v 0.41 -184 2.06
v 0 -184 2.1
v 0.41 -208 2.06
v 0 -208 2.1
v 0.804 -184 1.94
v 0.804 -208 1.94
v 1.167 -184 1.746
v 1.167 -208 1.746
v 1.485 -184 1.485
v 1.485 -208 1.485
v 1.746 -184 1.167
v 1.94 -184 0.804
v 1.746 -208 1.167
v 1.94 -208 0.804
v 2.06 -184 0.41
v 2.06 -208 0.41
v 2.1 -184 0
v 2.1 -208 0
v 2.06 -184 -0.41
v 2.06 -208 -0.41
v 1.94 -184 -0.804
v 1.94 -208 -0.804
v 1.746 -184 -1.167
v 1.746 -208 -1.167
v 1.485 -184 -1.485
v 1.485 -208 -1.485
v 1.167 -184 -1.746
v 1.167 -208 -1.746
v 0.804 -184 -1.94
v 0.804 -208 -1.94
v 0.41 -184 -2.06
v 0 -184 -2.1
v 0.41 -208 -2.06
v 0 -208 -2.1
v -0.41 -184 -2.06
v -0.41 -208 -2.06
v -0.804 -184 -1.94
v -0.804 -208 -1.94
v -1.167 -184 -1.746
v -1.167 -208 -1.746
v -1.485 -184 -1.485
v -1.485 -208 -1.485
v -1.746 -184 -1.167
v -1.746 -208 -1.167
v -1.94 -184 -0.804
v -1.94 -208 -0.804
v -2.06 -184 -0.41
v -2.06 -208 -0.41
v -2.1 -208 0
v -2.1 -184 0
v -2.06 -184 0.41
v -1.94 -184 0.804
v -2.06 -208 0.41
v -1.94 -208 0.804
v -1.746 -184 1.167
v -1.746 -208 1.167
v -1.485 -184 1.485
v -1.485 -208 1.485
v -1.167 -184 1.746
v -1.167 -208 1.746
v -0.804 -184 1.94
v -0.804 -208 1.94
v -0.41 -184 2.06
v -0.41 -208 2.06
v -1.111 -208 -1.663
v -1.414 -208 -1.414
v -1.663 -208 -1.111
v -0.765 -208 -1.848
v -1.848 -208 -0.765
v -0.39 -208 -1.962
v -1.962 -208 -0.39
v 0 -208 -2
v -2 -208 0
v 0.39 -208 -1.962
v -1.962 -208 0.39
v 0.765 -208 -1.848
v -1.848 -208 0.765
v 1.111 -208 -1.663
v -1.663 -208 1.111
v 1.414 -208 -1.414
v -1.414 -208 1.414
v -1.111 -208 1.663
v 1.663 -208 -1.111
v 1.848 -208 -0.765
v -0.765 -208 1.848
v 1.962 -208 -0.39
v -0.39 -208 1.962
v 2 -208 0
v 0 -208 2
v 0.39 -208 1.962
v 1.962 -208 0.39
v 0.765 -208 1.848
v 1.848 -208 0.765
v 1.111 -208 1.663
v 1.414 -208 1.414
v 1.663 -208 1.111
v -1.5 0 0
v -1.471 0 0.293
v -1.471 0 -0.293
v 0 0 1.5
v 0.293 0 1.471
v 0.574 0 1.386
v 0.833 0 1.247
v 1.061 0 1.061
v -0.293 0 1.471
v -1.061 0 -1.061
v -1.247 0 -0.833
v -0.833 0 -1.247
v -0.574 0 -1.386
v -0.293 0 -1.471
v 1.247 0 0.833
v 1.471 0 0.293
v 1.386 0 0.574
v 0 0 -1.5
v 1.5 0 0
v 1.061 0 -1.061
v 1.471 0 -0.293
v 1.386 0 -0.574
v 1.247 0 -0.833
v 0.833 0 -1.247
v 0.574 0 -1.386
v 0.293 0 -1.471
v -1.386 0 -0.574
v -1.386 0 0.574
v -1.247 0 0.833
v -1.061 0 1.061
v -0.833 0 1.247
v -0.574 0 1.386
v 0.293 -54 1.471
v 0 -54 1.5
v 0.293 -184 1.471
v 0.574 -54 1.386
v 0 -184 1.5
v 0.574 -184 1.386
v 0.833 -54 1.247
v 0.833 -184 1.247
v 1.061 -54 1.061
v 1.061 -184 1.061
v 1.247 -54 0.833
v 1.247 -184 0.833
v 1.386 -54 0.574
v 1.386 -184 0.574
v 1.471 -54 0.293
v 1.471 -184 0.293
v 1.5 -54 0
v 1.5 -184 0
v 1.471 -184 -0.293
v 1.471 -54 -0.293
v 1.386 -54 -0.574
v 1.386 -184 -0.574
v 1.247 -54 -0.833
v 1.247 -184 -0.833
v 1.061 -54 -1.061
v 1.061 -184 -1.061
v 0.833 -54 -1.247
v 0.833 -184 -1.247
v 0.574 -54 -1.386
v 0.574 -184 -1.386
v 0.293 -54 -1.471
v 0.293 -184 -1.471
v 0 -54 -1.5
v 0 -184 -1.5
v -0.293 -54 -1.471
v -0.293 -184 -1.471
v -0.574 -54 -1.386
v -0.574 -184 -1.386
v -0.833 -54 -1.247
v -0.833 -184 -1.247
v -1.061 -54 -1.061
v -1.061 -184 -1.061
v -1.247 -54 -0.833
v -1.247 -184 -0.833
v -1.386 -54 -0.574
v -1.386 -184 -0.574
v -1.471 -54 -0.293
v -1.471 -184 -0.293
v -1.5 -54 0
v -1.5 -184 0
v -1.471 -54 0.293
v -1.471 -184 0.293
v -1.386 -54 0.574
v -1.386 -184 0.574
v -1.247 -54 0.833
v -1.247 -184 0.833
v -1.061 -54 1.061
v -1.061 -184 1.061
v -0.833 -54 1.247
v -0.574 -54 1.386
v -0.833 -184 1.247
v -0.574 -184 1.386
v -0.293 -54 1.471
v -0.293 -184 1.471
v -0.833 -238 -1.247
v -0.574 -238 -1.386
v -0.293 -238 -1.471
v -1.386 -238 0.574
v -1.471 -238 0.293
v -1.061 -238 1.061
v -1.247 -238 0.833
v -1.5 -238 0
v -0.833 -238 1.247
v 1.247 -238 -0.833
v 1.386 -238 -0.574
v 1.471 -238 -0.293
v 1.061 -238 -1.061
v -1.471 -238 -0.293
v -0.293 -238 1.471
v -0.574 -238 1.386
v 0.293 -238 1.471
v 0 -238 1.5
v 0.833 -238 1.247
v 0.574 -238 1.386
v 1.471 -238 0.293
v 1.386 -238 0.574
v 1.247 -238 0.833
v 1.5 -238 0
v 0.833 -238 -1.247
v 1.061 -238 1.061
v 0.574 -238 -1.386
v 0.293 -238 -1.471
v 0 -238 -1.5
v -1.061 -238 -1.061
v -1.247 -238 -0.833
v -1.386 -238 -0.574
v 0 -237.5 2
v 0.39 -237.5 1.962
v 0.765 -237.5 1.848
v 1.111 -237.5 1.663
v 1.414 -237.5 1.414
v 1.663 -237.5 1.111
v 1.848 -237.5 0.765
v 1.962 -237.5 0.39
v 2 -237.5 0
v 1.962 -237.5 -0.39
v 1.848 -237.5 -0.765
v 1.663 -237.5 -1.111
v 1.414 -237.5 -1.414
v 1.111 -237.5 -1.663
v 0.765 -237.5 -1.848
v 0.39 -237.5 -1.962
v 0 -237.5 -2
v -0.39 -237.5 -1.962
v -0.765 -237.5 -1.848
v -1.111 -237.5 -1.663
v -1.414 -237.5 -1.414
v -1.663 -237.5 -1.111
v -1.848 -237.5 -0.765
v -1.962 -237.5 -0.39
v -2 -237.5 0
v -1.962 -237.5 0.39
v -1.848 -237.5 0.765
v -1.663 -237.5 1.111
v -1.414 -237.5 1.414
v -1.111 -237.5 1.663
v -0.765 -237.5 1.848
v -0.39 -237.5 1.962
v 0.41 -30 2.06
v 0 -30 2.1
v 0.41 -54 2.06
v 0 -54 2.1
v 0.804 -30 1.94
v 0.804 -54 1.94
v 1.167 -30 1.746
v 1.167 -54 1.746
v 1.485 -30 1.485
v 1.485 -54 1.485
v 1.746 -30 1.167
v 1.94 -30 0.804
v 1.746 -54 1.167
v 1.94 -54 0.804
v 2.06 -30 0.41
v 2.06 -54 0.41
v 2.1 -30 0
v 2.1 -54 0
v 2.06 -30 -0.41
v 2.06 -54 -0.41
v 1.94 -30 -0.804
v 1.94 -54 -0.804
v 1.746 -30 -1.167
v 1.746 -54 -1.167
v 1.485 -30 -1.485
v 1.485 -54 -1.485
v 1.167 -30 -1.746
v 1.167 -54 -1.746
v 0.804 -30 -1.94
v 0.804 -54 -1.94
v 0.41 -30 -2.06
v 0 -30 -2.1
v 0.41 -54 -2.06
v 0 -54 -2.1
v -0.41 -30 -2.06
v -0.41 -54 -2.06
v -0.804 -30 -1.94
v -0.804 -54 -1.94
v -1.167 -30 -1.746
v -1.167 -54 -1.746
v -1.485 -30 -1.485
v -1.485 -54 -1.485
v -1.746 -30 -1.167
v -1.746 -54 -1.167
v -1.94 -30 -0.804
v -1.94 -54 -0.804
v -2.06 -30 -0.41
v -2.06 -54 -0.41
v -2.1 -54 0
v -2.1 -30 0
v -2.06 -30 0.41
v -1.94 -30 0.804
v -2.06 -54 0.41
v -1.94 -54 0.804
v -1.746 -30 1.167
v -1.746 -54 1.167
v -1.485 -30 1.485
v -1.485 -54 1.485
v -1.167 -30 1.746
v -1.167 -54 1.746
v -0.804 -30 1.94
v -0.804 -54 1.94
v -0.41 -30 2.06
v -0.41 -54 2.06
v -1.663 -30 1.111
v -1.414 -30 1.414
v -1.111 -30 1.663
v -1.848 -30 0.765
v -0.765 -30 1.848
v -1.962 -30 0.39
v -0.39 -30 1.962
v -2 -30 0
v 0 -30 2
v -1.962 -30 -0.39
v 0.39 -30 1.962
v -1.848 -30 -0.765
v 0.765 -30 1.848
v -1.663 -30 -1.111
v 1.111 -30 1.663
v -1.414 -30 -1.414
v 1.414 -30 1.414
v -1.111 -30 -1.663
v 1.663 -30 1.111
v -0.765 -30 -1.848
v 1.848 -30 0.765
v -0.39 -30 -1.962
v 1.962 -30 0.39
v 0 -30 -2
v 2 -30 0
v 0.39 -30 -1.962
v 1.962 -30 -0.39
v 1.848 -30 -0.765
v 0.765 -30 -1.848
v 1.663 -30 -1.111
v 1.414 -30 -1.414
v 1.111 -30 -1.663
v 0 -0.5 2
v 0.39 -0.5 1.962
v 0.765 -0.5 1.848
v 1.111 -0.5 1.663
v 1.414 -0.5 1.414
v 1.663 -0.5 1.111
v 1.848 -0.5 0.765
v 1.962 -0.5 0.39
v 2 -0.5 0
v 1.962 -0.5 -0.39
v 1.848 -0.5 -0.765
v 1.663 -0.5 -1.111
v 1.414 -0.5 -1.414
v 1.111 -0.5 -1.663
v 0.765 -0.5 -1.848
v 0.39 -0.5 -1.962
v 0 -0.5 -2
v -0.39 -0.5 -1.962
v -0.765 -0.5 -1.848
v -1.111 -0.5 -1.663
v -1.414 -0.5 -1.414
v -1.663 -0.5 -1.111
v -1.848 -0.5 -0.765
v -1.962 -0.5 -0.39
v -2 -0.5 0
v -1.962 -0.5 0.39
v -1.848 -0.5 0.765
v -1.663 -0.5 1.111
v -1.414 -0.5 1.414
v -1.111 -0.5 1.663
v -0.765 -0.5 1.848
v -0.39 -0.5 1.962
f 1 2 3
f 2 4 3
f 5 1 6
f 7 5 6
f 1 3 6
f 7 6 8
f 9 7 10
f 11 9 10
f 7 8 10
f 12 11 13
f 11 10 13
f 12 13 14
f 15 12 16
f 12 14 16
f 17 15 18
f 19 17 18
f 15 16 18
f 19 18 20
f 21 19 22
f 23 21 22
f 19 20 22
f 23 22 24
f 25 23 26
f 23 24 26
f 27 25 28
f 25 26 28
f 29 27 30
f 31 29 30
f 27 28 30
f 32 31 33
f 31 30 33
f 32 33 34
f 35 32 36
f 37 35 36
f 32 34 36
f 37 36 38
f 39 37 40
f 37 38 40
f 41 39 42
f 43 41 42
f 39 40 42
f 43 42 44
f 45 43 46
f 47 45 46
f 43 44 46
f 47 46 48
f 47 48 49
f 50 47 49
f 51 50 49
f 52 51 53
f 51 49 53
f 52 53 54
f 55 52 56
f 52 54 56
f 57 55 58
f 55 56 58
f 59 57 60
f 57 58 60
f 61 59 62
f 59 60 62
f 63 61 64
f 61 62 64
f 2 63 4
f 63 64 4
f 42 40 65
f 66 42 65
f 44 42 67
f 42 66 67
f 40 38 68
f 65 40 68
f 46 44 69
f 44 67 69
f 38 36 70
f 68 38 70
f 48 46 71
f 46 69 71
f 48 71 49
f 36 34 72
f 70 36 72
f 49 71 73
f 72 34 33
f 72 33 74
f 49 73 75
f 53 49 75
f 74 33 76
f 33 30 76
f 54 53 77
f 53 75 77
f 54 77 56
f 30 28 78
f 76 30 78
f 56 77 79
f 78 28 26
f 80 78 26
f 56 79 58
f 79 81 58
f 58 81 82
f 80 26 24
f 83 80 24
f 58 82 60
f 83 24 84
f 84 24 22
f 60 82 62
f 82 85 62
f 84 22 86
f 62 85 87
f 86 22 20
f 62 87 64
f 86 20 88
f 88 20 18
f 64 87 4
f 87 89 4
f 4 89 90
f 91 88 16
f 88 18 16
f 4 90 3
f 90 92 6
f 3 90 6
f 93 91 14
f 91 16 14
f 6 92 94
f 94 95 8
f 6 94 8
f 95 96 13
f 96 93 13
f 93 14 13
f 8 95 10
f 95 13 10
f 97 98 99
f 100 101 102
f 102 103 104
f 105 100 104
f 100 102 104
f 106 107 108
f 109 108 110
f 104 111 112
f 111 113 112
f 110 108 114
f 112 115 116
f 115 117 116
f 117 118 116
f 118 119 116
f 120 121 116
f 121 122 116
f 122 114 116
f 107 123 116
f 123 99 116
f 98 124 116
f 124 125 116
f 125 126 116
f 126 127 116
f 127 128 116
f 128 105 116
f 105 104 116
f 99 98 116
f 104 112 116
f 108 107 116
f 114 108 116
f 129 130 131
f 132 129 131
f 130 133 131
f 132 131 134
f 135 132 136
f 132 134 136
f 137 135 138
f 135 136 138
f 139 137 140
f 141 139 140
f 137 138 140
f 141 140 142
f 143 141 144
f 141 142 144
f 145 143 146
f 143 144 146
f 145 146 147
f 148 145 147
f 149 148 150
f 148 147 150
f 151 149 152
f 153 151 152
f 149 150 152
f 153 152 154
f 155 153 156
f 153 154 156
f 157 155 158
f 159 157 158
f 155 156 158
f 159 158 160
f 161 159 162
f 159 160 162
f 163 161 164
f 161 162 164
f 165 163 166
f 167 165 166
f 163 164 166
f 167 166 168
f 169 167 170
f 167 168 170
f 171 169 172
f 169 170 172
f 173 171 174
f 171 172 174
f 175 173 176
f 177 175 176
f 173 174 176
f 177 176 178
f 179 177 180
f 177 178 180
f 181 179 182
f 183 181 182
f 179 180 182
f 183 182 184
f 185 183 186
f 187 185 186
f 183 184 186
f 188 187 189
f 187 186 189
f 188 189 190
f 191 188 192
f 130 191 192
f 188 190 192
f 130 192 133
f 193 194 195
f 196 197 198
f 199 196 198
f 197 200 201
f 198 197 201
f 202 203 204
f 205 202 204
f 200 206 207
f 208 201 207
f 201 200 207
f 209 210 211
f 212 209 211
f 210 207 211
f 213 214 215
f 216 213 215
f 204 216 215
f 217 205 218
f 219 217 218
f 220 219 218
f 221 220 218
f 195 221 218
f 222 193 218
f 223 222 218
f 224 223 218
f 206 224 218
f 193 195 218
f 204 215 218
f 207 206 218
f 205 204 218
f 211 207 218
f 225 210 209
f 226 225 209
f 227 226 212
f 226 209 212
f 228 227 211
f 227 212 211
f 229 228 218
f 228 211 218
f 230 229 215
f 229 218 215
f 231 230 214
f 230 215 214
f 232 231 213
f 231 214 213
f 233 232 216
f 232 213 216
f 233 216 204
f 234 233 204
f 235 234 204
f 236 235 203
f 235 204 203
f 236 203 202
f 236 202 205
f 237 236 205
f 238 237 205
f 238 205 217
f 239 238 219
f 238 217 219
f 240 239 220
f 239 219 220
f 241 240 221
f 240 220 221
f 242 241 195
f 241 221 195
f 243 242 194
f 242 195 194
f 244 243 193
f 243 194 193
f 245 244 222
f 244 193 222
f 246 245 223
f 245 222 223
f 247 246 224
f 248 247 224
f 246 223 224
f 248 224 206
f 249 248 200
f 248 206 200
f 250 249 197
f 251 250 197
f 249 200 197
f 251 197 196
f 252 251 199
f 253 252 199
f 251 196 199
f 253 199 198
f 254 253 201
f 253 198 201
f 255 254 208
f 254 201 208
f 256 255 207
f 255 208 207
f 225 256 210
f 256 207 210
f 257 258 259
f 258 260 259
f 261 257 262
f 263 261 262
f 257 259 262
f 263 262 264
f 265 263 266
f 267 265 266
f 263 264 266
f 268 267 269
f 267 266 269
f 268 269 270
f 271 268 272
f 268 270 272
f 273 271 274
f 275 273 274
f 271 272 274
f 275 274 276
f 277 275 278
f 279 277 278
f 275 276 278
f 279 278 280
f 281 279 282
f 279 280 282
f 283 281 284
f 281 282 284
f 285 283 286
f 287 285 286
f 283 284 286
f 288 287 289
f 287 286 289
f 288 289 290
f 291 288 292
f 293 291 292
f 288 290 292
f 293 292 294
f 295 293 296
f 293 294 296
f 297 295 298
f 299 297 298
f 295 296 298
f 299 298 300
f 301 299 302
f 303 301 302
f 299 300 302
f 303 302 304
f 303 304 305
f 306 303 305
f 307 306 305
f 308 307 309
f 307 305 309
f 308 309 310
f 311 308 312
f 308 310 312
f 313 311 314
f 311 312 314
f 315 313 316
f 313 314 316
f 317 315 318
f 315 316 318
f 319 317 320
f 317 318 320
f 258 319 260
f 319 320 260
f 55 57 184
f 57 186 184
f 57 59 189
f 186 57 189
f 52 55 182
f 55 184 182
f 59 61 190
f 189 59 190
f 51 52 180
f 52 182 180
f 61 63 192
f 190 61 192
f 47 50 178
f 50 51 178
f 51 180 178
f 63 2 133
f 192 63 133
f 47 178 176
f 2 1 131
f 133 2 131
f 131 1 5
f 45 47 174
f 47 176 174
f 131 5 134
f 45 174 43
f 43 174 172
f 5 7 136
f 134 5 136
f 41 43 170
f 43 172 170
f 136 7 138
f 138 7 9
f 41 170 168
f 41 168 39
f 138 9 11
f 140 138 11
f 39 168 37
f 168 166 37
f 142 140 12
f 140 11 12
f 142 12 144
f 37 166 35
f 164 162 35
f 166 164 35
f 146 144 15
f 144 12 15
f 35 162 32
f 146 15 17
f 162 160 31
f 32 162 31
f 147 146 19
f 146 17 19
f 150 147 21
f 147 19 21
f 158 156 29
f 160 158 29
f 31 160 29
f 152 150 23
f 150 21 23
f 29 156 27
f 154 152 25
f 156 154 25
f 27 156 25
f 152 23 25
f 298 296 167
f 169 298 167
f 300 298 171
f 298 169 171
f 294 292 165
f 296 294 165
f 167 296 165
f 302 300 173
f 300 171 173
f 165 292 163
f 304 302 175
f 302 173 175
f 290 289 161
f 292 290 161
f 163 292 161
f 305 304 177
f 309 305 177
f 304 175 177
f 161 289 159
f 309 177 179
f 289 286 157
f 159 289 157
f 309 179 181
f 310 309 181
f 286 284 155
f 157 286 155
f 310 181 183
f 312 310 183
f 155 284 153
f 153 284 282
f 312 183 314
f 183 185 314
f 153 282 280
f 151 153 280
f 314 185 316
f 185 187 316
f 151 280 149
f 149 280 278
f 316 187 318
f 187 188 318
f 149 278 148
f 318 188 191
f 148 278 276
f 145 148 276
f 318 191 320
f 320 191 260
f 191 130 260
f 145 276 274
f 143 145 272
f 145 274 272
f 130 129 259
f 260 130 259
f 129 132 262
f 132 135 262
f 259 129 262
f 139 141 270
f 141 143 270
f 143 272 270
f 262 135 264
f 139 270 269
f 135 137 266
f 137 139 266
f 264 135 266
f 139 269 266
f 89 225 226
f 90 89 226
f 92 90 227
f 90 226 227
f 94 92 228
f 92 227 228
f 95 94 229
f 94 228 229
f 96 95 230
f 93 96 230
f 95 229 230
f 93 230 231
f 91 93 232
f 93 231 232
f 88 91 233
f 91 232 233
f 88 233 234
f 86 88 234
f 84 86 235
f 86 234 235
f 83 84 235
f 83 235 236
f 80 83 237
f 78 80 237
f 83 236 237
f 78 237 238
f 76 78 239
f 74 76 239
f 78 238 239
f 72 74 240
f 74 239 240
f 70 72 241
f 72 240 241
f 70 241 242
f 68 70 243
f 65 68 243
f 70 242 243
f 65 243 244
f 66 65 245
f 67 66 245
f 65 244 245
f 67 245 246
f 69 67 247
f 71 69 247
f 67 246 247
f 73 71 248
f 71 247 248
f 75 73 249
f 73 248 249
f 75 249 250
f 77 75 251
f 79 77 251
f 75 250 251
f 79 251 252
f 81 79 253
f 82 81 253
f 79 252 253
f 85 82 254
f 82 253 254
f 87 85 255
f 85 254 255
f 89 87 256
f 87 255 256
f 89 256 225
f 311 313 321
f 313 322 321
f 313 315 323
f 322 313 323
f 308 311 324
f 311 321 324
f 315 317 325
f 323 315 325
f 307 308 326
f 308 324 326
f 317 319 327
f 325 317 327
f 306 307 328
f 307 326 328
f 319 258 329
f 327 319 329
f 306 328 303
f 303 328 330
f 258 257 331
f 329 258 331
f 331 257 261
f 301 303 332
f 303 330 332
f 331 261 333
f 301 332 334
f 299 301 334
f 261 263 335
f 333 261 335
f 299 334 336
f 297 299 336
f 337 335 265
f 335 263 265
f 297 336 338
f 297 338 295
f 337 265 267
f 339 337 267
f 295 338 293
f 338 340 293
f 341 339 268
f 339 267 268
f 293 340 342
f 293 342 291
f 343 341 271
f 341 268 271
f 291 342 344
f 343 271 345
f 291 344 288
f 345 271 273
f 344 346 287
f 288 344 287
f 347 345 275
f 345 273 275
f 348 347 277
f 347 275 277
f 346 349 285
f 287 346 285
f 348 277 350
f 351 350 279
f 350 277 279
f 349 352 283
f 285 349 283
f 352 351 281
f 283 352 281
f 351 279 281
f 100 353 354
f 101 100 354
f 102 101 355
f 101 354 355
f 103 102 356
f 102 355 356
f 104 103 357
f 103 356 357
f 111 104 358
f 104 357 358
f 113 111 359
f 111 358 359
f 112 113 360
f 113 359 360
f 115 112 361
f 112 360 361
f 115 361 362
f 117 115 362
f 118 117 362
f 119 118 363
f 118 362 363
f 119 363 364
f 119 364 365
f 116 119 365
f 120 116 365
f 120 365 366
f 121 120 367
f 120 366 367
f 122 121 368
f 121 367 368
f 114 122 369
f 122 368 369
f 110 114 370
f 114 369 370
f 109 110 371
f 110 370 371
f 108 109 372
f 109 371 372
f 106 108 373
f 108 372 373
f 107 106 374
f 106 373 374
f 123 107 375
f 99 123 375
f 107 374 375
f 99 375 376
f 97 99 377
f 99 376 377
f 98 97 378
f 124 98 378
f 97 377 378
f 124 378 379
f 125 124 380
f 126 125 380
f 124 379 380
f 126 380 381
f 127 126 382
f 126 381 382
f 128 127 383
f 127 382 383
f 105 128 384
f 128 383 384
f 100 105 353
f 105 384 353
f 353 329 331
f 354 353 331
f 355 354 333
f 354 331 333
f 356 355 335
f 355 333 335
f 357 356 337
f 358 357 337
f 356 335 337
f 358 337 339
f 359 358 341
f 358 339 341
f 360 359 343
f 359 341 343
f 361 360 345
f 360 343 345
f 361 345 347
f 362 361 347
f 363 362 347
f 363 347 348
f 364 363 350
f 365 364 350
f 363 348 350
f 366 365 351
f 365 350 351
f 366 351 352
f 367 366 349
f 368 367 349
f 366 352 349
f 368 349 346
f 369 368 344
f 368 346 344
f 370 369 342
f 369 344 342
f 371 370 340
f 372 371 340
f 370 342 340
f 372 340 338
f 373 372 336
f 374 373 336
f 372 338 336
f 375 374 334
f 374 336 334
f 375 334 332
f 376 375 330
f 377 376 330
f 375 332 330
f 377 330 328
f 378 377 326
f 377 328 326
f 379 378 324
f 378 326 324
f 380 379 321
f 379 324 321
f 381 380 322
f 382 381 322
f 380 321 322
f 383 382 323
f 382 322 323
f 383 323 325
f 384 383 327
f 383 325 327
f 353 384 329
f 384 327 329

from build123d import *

# Parameters (mm, degrees)
FASE1_SIZE = 0.5


with BuildPart() as part:
    # Skizze1 → Rotation1 (revolve)
    with BuildSketch(Plane(origin=(0, 0, 0), x_dir=(0, 0, -1), z_dir=(1, 0, 0))):
        Polygon((0, 0), (-2, 0), (-2, -30), (-2.1, -30), (-2.1, -54), (-1.5, -54), (-1.5, -184), (-2.1, -184), (-2.1, -208), (-2, -208), (-2, -238), (0, -238), align=None)
    revolve(axis=Axis((0, 0, 0), (0, 1, 0)))

    # Fase1
    fase1_edges = [part.edges().sort_by_distance(p)[0] for p in [
        (0, 0, -2),
        (0, -238, -2),
    ]]
    chamfer(fase1_edges, length=FASE1_SIZE)


solid = part.part
